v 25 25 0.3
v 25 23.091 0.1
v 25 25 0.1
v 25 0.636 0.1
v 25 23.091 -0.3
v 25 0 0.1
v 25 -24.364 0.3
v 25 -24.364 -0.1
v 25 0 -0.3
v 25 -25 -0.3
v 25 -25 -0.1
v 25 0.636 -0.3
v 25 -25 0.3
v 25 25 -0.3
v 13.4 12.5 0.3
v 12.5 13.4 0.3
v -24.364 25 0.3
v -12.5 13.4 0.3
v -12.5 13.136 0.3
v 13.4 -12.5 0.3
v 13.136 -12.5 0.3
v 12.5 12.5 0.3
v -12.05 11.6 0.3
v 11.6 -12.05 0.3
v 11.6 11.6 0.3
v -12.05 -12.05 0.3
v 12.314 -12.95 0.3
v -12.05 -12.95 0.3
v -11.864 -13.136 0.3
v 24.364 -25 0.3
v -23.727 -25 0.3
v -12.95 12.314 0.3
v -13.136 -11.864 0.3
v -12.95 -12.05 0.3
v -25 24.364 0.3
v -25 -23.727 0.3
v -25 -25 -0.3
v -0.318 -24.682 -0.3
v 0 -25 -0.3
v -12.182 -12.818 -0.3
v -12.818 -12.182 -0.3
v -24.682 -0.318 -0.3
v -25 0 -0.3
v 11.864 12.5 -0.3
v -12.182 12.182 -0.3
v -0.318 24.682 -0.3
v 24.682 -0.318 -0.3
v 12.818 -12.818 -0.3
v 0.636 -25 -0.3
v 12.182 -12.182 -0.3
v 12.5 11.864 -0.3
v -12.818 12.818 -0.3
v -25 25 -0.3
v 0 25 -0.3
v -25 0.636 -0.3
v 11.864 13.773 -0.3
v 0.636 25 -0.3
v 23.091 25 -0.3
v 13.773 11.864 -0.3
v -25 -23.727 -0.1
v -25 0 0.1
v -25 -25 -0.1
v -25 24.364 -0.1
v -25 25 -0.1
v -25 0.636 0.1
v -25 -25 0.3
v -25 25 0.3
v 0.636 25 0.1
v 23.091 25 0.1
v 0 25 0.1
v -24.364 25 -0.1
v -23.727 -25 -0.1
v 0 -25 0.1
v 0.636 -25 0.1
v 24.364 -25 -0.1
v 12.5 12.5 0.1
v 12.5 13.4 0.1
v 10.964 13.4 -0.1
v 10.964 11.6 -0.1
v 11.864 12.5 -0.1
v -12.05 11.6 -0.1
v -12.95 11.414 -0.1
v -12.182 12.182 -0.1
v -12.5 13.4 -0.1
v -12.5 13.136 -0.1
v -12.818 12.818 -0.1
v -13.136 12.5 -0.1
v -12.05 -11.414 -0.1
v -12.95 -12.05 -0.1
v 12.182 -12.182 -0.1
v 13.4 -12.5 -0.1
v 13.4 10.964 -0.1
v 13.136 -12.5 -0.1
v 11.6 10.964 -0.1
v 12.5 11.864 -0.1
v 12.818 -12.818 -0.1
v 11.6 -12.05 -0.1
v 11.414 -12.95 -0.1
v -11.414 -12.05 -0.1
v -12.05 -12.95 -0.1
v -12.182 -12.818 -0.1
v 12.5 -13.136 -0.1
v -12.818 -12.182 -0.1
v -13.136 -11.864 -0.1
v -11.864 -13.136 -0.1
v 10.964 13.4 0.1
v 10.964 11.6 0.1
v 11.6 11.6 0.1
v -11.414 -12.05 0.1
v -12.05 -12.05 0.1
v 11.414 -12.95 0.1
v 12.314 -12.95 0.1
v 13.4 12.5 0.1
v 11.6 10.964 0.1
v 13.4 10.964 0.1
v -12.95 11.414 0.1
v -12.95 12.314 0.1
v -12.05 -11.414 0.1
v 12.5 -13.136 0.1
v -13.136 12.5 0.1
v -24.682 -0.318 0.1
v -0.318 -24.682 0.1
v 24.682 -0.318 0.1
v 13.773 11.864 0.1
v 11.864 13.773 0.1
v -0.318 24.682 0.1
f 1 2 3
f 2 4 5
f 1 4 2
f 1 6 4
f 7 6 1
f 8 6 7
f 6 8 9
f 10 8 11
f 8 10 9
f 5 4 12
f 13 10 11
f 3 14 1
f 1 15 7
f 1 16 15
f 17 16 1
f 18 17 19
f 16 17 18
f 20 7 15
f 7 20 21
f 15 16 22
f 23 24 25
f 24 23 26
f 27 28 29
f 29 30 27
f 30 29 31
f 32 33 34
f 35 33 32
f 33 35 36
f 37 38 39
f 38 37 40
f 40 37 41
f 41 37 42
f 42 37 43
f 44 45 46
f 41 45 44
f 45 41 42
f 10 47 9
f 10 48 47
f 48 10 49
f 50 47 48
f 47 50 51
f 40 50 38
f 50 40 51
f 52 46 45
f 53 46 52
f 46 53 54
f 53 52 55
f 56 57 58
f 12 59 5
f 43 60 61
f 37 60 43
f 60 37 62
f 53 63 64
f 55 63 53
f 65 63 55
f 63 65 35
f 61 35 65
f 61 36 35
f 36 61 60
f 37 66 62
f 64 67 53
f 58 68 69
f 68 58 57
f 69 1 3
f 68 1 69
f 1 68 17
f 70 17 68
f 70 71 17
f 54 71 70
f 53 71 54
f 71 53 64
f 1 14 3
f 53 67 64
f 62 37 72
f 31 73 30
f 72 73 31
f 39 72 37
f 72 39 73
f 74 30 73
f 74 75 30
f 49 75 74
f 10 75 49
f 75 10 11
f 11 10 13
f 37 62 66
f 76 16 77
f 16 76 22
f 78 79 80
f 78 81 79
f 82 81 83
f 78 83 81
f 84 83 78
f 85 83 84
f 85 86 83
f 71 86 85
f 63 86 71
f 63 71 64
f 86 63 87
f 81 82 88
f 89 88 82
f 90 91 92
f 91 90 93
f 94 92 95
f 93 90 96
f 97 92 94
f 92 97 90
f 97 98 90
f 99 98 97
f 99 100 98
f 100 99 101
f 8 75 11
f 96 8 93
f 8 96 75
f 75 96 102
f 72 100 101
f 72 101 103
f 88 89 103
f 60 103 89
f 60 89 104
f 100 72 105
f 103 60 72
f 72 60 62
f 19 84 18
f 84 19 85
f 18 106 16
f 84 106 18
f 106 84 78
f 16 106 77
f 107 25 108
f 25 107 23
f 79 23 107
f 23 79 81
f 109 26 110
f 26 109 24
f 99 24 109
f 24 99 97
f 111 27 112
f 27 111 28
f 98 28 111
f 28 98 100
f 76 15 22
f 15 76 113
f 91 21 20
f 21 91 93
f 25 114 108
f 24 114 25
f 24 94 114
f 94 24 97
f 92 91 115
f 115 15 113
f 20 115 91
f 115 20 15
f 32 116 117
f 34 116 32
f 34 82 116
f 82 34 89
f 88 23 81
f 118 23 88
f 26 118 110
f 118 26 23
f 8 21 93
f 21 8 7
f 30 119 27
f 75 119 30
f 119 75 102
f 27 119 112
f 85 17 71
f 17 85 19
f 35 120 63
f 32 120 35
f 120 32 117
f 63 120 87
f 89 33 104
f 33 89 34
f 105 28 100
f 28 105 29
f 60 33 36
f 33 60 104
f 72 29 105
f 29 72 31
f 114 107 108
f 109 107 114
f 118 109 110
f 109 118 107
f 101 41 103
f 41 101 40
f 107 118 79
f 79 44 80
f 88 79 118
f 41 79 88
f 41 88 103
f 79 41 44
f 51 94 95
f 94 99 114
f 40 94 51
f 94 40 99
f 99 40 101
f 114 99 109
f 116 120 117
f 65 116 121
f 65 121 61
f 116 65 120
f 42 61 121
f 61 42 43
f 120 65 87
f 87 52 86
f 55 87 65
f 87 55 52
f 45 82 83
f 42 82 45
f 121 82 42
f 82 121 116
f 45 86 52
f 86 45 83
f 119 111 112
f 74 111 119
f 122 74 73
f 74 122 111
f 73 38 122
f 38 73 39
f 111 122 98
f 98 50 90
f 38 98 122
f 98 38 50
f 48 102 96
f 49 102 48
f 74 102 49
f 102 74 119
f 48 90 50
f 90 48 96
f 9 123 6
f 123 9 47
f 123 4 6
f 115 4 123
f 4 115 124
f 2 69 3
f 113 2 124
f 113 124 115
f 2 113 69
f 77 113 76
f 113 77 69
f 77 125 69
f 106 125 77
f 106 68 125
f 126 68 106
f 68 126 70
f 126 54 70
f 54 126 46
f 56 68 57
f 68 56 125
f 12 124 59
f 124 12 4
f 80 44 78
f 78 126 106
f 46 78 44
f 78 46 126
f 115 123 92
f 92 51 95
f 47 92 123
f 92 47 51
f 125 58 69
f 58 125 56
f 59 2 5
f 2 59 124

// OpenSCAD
// paper size
size=50;

thickness=.6; // paper thickness
thickfold=.2; // thickness at folding lines

tam2=size/2;
tam4=size/4;
tam8=size/8;
3tam8=3*tam8;
stam2=sqrt(2)*tam2;
stam4=sqrt(2)*tam4;

module corte(transx,transy,dir,rot,size,pliegues) {
  translate([transx,transy,dir*thickfold]) rotate(rot) 
      cube([size,1.5*pliegues*thickness,thickness],center=true);
}

module hoja() { 
  difference() {
    cube([size,size,thickness],center=true);

    corte(0,+tam4,+1,[0,0,0],tam2,2);
    corte(0,-tam4,+1,[0,0,0],tam2,1);
    corte(tam4,0,+1,[0,0,90],tam2,2);
    corte(-tam4,0,+1,[0,0,90],tam2,1);

    corte(+3tam8,-3tam8,+1,[0,0,-45],stam4,1);
    corte(-3tam8,+3tam8,+1,[0,0,-45],stam4,1);
    corte(-3tam8,-3tam8,+1,[0,0,45],stam4,2);
    
    corte(0,0,-1,[0,0,45],stam2,1);  
    corte(-3tam8,tam8,-1,[0,0,45],stam4,1);  
    corte(+tam8,-3tam8,-1,[0,0,45],stam4,1);  
    corte(+tam4,tam4,-1,[0,0,-45],stam2,1);
    corte(+3tam8,3tam8,-1,[0,0,45],stam4,3);

  }
}

hoja();
